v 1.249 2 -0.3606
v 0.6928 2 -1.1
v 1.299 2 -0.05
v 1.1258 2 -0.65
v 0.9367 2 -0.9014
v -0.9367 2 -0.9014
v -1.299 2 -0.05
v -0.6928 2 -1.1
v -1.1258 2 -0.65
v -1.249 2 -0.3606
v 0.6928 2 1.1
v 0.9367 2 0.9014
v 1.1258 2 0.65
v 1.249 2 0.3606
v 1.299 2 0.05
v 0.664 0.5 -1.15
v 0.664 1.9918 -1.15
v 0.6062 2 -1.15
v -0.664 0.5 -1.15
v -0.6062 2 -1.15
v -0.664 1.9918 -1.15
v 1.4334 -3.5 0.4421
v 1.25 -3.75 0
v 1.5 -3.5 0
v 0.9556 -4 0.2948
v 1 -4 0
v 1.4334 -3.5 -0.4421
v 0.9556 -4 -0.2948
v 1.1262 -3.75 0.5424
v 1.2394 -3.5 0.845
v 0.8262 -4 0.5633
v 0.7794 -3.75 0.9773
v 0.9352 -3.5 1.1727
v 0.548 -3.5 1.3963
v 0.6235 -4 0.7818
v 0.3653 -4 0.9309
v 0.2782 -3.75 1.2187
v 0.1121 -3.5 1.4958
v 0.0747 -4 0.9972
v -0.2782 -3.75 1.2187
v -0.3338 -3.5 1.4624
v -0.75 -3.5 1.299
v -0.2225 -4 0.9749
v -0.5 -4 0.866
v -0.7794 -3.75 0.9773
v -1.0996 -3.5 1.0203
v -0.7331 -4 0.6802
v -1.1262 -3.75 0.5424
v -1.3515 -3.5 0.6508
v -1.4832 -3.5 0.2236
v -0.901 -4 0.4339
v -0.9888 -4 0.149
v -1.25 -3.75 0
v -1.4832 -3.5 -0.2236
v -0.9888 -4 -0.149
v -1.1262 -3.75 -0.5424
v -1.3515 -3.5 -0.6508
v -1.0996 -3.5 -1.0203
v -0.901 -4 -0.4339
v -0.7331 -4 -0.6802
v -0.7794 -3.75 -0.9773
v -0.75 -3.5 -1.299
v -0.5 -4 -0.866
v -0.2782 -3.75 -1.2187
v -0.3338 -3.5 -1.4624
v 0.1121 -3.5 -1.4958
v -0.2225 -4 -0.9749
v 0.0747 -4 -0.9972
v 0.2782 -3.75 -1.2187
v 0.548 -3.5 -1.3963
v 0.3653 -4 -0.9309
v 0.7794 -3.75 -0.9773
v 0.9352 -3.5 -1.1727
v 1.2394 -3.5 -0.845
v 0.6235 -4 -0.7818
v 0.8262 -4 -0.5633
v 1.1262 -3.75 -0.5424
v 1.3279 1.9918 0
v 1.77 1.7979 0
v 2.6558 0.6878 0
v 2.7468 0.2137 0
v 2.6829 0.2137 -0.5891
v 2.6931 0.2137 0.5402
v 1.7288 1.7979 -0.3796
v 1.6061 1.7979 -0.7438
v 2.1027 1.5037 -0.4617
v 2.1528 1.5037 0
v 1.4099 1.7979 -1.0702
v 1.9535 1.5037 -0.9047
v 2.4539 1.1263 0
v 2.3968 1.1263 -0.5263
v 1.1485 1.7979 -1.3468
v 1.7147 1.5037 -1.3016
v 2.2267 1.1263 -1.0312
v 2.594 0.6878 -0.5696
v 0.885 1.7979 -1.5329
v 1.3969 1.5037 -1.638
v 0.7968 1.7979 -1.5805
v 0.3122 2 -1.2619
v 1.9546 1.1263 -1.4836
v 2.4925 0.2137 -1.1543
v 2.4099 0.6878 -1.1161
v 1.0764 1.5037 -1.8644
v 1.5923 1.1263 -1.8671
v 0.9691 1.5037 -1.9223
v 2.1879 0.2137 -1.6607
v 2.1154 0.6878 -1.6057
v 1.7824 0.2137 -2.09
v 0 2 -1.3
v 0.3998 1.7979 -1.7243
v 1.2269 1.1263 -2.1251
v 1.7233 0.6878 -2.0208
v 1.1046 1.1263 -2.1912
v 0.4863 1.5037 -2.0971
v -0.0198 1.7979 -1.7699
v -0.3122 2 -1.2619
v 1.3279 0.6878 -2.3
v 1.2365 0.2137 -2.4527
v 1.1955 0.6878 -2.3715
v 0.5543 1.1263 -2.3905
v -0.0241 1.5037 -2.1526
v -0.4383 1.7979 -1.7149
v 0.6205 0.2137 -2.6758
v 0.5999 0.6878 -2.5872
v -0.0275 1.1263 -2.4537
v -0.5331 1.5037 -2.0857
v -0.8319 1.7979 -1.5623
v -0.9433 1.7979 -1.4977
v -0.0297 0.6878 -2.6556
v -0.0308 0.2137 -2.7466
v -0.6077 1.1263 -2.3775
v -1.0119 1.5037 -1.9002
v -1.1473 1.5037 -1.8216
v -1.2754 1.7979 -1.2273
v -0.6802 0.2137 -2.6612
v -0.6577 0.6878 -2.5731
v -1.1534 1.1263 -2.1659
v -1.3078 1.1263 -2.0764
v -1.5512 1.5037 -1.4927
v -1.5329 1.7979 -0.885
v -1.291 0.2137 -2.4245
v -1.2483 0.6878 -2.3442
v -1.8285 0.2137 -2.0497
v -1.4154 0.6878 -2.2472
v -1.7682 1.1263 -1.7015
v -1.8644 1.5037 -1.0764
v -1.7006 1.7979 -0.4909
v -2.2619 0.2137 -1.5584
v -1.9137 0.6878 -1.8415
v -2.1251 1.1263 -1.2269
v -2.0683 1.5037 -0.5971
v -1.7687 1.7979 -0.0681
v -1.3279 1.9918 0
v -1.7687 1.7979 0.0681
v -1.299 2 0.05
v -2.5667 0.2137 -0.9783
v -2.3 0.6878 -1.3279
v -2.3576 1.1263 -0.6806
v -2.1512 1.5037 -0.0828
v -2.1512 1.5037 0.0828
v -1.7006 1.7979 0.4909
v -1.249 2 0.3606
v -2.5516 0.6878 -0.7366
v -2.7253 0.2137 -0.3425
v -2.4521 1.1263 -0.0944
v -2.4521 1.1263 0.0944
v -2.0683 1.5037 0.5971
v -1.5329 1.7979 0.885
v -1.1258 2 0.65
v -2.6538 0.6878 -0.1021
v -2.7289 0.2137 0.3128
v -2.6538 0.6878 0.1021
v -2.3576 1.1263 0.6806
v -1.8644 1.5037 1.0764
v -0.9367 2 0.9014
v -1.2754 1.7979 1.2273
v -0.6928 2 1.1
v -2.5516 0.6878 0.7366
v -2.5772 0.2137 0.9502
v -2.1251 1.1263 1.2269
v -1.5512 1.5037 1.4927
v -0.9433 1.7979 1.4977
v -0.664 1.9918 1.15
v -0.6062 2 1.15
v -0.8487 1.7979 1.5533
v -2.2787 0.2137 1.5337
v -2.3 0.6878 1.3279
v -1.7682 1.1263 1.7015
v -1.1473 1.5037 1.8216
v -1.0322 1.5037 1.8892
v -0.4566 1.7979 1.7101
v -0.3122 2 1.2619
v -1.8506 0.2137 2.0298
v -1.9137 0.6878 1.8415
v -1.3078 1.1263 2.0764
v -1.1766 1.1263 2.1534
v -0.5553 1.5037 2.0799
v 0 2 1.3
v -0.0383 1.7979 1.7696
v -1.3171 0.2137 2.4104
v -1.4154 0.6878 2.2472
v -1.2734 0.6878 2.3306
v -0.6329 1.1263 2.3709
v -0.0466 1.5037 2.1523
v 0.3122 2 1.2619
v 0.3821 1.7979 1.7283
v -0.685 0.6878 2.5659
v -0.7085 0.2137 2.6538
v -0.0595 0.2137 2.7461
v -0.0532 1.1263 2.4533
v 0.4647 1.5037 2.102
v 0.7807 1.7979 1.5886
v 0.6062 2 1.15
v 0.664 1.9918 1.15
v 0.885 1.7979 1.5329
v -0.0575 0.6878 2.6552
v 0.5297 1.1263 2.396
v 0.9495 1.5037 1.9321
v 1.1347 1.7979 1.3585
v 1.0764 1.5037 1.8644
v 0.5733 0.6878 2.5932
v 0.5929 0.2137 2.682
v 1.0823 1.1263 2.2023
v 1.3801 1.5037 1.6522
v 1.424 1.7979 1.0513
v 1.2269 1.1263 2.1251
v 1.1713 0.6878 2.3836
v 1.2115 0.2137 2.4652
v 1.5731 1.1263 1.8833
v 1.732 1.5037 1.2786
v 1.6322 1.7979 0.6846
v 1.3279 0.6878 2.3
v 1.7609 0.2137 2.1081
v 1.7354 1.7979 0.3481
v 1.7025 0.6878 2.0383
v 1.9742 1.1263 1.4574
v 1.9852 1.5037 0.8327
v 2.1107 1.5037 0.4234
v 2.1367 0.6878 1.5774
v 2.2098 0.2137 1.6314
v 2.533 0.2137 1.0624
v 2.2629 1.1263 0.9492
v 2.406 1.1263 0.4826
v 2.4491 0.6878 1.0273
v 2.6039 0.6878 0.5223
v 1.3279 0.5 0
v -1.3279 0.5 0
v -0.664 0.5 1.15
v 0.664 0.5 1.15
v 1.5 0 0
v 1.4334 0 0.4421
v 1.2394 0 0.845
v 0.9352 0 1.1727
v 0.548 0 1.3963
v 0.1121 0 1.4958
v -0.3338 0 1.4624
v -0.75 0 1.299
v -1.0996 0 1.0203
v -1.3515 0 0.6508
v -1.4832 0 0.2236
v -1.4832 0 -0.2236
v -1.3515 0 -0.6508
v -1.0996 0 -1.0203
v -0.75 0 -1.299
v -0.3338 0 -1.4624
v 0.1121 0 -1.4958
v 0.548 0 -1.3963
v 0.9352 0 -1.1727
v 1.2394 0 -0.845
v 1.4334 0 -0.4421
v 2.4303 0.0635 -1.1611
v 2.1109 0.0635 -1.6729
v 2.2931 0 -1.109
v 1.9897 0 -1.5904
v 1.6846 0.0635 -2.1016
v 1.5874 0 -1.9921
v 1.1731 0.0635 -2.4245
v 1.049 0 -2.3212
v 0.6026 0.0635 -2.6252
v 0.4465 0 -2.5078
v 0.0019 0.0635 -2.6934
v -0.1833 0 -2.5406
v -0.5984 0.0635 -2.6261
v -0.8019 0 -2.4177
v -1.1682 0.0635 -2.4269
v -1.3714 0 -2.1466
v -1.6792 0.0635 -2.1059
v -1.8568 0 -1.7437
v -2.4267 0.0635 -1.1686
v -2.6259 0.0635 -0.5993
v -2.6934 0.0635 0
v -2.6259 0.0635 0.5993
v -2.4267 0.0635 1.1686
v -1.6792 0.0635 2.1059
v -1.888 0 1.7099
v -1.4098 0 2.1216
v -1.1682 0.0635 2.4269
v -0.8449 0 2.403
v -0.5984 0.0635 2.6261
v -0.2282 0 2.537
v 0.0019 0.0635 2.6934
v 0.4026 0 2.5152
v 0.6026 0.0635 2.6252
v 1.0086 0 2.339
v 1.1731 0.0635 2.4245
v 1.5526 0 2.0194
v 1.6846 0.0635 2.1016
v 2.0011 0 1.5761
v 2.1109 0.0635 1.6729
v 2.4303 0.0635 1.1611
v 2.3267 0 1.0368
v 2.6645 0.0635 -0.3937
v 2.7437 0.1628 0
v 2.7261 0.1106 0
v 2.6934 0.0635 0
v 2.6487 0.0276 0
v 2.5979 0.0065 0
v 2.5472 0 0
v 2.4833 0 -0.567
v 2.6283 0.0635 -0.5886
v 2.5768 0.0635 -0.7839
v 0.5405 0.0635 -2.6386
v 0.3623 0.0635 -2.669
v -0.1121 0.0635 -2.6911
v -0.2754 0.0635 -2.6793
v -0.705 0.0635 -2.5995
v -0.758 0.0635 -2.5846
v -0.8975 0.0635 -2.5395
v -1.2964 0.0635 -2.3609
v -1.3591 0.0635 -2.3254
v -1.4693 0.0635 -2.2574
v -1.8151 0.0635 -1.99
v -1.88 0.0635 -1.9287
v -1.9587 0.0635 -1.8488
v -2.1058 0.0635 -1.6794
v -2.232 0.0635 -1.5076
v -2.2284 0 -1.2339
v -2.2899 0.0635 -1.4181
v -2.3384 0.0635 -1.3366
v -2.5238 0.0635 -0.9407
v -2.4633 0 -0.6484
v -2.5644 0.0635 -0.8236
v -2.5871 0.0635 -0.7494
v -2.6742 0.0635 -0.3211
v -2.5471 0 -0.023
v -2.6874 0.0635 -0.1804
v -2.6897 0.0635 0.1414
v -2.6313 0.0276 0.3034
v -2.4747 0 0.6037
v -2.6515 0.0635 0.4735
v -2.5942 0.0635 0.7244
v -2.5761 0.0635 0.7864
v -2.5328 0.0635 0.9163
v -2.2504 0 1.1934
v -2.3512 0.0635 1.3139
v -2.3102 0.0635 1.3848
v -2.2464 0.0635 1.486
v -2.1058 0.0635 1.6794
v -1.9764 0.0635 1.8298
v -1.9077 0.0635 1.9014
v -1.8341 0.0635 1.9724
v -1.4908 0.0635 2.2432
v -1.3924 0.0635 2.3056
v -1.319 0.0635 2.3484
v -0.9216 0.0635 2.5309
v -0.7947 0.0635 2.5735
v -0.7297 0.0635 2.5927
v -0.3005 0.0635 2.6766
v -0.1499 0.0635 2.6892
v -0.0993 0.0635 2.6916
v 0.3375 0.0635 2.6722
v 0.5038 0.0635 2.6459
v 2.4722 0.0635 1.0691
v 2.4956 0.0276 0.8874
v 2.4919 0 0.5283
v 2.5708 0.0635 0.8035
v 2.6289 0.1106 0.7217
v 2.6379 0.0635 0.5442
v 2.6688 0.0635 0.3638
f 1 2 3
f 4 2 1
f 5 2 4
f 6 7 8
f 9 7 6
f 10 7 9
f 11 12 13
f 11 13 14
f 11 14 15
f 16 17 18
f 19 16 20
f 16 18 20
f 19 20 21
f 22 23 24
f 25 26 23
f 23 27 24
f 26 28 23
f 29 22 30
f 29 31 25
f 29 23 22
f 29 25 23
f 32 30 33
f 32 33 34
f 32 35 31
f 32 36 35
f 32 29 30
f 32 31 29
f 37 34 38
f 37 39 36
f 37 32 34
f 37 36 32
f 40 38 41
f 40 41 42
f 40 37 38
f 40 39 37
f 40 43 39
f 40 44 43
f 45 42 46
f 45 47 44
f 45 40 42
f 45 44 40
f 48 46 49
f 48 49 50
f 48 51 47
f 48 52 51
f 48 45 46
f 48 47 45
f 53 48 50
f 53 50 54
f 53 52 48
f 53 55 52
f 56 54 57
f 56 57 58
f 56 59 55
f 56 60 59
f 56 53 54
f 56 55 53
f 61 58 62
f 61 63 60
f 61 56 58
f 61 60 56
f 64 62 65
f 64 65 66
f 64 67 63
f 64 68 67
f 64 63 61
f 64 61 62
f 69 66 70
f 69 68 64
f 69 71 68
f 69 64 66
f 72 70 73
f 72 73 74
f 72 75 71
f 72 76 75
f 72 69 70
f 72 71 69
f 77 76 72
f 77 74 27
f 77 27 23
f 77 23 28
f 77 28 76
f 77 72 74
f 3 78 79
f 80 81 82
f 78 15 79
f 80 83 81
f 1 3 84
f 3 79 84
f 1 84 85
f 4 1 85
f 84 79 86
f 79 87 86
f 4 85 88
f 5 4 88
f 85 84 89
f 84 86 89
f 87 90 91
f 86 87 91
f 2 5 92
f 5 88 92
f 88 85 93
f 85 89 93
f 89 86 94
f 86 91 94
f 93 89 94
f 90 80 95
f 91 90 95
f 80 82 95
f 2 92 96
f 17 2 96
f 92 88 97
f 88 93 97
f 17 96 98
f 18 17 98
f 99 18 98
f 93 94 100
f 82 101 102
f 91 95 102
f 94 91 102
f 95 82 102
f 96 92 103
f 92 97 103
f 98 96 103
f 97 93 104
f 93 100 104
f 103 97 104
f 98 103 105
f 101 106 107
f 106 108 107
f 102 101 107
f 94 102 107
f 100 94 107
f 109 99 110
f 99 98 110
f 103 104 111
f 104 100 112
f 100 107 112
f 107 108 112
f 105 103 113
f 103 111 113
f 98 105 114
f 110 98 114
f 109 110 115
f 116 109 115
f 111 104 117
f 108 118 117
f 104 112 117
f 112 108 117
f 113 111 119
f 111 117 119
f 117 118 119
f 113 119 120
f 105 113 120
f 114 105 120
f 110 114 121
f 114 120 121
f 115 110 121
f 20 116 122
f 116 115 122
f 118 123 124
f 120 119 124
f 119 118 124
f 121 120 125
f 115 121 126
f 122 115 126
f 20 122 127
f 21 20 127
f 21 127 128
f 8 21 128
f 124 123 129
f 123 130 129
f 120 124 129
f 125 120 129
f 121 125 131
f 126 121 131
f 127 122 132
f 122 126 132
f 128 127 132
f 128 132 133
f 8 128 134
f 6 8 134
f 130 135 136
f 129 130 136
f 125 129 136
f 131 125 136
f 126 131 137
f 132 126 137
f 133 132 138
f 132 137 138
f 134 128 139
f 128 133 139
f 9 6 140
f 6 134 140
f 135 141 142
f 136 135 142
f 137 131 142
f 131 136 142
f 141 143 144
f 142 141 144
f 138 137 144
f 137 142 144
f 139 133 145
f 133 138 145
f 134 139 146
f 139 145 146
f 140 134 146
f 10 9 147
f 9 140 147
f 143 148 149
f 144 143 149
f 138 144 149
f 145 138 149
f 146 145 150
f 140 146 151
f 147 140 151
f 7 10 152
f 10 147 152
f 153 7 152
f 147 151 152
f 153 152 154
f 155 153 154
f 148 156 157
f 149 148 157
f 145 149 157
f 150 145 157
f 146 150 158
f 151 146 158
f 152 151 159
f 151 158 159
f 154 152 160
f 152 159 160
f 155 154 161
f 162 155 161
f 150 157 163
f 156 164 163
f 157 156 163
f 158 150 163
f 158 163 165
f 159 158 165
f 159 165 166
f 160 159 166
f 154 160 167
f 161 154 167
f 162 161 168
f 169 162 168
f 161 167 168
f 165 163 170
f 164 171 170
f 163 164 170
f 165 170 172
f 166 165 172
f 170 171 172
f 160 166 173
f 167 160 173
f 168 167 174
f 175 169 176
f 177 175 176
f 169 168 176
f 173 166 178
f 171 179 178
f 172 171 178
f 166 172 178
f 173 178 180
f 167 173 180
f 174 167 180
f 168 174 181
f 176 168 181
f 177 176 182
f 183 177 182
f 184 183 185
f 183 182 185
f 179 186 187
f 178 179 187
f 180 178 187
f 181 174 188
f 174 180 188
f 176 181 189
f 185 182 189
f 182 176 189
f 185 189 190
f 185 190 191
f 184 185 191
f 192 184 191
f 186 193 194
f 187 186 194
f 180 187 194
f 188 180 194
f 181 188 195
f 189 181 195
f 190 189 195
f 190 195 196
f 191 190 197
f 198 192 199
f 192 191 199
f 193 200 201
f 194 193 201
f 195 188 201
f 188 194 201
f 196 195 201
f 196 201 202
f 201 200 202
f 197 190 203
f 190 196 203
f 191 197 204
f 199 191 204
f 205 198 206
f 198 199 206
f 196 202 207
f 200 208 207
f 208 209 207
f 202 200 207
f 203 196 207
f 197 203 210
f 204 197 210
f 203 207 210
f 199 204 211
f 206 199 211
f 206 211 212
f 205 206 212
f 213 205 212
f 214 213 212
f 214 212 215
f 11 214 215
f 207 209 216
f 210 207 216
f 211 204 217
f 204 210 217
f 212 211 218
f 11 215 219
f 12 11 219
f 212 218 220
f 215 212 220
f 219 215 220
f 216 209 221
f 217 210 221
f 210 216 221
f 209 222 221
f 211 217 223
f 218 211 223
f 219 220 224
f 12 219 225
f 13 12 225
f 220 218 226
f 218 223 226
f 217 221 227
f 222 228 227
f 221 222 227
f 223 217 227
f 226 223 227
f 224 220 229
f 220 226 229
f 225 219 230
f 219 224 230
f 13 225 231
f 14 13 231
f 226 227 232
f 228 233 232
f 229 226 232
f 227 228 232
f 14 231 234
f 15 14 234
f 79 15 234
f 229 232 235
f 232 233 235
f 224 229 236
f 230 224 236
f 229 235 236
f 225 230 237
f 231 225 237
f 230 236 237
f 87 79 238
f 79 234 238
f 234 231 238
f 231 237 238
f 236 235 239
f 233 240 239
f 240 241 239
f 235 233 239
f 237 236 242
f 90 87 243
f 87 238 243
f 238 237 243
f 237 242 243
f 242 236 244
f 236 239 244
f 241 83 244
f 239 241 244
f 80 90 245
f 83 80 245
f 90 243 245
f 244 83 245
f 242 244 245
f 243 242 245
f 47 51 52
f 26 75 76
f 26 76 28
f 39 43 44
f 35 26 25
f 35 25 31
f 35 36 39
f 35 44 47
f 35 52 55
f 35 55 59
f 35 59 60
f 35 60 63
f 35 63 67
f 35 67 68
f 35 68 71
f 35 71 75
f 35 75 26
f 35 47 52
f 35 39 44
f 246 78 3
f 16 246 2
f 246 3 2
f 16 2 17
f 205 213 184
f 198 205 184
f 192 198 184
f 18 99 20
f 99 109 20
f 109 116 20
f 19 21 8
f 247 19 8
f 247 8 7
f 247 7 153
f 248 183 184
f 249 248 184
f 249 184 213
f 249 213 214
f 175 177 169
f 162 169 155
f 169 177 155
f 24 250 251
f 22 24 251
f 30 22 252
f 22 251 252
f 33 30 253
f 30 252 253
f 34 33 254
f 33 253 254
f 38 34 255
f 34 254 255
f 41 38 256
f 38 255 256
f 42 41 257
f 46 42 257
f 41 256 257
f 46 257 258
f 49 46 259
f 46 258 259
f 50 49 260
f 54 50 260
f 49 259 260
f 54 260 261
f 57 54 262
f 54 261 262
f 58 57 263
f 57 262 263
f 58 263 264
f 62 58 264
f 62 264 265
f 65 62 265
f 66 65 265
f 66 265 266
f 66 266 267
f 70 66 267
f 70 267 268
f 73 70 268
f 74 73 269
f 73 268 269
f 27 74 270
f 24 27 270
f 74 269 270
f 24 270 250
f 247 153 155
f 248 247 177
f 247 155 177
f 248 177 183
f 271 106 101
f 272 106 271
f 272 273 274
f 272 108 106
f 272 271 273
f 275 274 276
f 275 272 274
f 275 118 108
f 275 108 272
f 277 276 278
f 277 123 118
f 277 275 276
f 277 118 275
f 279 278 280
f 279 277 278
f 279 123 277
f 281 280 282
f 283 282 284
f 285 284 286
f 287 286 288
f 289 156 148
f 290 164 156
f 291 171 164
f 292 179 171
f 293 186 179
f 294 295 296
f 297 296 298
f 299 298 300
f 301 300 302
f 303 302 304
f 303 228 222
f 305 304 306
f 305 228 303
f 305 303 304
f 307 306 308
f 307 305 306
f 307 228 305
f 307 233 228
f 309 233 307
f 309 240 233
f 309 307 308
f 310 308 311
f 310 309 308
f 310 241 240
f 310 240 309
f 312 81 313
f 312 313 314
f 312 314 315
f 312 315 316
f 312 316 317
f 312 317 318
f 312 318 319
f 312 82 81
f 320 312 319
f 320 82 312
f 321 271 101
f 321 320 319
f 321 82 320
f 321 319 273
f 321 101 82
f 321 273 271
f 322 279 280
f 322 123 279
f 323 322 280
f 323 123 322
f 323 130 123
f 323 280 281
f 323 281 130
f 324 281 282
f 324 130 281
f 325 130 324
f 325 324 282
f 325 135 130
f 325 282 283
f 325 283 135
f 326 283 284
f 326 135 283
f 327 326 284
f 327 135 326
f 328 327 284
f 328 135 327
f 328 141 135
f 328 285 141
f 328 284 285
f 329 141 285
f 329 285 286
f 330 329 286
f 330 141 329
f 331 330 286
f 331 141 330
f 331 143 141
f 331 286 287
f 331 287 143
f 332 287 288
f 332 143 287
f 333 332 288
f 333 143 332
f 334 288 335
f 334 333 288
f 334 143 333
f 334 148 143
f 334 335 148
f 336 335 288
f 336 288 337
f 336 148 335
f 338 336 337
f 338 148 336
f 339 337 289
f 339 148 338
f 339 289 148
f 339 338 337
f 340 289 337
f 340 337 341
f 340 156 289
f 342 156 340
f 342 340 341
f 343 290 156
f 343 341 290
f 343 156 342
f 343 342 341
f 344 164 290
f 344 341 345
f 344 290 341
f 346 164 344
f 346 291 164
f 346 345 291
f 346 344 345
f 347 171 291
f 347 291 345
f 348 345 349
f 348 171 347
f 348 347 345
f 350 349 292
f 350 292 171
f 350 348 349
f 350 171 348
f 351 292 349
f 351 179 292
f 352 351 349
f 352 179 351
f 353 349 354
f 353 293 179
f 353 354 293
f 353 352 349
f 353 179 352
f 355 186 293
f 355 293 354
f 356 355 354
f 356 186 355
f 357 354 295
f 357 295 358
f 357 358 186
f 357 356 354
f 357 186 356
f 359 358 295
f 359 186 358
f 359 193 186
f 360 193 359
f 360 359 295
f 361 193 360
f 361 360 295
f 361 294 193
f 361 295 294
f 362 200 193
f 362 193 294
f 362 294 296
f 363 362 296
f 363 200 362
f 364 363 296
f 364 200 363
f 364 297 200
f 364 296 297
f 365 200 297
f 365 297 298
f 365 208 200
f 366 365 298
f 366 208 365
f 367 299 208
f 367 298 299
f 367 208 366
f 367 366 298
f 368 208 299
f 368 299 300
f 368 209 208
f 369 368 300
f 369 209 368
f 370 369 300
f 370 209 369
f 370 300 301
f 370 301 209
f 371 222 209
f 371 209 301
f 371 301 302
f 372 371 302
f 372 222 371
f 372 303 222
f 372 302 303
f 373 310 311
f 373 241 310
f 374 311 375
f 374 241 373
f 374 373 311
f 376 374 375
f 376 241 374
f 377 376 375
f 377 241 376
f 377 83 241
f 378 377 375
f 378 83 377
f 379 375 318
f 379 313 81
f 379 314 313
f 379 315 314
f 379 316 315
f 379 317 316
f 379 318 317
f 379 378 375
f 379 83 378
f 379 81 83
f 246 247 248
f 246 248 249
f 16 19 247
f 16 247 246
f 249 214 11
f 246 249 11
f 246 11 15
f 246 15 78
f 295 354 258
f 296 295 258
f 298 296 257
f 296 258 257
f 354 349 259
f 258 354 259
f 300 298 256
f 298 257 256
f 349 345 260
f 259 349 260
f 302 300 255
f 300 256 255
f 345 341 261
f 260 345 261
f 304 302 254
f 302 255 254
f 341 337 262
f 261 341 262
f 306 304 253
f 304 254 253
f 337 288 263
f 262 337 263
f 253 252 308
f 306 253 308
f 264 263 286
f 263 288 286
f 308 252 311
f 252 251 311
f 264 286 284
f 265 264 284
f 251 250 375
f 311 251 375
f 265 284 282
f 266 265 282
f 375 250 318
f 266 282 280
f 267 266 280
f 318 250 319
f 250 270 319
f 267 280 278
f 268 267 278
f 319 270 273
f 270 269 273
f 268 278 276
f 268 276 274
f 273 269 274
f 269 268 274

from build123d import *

# Parameters (mm, degrees)
FILLET_1_R          = 0.2
CUT_EXTRUDE_1_DEPTH = 1.5
SKETCH_3_R          = 1.5
EXTRUDE_1_DEPTH     = 4
CHAMFER_1_SIZE      = 0.5


with BuildPart() as part:
    # 草图1 → 旋转1 (revolve)
    with BuildSketch(Plane.XY):
        with BuildLine():
            Line((0, 0), (0, 2))
            Line((0, 2), (1.3, 2))
            ThreePointArc((1.3, 2), (2.370691821, 1.250626571), (2.75, 0))
            Line((2.75, 0), (0, 0))
        make_face()
    revolve(axis=Axis((0, 0, 0), (0, 1, 0)))

    # 圆角1
    fillet_1_edges = [part.edges().sort_by_distance(p)[0] for p in [
        (-2.75, 0, 0),
    ]]
    fillet(fillet_1_edges, radius=FILLET_1_R)

    # 草图2 → 切除-拉伸1 (cut)
    with BuildSketch(Plane(origin=(0, 2, 0), x_dir=(1, 0, 0), z_dir=(0, 1, 0))):
        Polygon((1.327905619, 0), (0.66395281, 1.15), (-0.66395281, 1.15), (-1.327905619, 0), (-0.66395281, -1.15), (0.66395281, -1.15), align=None)
    extrude(amount=-CUT_EXTRUDE_1_DEPTH, mode=Mode.SUBTRACT)

    # 草图3 → 凸台-拉伸1 (add)
    with BuildSketch(Plane.XZ):
        Circle(SKETCH_3_R)
    extrude(amount=EXTRUDE_1_DEPTH)

    # 倒角1
    chamfer_1_edges = [part.edges().sort_by_distance(p)[0] for p in [
        (-1.5, -4, 0),
    ]]
    chamfer(chamfer_1_edges, length=CHAMFER_1_SIZE)


solid = part.part
